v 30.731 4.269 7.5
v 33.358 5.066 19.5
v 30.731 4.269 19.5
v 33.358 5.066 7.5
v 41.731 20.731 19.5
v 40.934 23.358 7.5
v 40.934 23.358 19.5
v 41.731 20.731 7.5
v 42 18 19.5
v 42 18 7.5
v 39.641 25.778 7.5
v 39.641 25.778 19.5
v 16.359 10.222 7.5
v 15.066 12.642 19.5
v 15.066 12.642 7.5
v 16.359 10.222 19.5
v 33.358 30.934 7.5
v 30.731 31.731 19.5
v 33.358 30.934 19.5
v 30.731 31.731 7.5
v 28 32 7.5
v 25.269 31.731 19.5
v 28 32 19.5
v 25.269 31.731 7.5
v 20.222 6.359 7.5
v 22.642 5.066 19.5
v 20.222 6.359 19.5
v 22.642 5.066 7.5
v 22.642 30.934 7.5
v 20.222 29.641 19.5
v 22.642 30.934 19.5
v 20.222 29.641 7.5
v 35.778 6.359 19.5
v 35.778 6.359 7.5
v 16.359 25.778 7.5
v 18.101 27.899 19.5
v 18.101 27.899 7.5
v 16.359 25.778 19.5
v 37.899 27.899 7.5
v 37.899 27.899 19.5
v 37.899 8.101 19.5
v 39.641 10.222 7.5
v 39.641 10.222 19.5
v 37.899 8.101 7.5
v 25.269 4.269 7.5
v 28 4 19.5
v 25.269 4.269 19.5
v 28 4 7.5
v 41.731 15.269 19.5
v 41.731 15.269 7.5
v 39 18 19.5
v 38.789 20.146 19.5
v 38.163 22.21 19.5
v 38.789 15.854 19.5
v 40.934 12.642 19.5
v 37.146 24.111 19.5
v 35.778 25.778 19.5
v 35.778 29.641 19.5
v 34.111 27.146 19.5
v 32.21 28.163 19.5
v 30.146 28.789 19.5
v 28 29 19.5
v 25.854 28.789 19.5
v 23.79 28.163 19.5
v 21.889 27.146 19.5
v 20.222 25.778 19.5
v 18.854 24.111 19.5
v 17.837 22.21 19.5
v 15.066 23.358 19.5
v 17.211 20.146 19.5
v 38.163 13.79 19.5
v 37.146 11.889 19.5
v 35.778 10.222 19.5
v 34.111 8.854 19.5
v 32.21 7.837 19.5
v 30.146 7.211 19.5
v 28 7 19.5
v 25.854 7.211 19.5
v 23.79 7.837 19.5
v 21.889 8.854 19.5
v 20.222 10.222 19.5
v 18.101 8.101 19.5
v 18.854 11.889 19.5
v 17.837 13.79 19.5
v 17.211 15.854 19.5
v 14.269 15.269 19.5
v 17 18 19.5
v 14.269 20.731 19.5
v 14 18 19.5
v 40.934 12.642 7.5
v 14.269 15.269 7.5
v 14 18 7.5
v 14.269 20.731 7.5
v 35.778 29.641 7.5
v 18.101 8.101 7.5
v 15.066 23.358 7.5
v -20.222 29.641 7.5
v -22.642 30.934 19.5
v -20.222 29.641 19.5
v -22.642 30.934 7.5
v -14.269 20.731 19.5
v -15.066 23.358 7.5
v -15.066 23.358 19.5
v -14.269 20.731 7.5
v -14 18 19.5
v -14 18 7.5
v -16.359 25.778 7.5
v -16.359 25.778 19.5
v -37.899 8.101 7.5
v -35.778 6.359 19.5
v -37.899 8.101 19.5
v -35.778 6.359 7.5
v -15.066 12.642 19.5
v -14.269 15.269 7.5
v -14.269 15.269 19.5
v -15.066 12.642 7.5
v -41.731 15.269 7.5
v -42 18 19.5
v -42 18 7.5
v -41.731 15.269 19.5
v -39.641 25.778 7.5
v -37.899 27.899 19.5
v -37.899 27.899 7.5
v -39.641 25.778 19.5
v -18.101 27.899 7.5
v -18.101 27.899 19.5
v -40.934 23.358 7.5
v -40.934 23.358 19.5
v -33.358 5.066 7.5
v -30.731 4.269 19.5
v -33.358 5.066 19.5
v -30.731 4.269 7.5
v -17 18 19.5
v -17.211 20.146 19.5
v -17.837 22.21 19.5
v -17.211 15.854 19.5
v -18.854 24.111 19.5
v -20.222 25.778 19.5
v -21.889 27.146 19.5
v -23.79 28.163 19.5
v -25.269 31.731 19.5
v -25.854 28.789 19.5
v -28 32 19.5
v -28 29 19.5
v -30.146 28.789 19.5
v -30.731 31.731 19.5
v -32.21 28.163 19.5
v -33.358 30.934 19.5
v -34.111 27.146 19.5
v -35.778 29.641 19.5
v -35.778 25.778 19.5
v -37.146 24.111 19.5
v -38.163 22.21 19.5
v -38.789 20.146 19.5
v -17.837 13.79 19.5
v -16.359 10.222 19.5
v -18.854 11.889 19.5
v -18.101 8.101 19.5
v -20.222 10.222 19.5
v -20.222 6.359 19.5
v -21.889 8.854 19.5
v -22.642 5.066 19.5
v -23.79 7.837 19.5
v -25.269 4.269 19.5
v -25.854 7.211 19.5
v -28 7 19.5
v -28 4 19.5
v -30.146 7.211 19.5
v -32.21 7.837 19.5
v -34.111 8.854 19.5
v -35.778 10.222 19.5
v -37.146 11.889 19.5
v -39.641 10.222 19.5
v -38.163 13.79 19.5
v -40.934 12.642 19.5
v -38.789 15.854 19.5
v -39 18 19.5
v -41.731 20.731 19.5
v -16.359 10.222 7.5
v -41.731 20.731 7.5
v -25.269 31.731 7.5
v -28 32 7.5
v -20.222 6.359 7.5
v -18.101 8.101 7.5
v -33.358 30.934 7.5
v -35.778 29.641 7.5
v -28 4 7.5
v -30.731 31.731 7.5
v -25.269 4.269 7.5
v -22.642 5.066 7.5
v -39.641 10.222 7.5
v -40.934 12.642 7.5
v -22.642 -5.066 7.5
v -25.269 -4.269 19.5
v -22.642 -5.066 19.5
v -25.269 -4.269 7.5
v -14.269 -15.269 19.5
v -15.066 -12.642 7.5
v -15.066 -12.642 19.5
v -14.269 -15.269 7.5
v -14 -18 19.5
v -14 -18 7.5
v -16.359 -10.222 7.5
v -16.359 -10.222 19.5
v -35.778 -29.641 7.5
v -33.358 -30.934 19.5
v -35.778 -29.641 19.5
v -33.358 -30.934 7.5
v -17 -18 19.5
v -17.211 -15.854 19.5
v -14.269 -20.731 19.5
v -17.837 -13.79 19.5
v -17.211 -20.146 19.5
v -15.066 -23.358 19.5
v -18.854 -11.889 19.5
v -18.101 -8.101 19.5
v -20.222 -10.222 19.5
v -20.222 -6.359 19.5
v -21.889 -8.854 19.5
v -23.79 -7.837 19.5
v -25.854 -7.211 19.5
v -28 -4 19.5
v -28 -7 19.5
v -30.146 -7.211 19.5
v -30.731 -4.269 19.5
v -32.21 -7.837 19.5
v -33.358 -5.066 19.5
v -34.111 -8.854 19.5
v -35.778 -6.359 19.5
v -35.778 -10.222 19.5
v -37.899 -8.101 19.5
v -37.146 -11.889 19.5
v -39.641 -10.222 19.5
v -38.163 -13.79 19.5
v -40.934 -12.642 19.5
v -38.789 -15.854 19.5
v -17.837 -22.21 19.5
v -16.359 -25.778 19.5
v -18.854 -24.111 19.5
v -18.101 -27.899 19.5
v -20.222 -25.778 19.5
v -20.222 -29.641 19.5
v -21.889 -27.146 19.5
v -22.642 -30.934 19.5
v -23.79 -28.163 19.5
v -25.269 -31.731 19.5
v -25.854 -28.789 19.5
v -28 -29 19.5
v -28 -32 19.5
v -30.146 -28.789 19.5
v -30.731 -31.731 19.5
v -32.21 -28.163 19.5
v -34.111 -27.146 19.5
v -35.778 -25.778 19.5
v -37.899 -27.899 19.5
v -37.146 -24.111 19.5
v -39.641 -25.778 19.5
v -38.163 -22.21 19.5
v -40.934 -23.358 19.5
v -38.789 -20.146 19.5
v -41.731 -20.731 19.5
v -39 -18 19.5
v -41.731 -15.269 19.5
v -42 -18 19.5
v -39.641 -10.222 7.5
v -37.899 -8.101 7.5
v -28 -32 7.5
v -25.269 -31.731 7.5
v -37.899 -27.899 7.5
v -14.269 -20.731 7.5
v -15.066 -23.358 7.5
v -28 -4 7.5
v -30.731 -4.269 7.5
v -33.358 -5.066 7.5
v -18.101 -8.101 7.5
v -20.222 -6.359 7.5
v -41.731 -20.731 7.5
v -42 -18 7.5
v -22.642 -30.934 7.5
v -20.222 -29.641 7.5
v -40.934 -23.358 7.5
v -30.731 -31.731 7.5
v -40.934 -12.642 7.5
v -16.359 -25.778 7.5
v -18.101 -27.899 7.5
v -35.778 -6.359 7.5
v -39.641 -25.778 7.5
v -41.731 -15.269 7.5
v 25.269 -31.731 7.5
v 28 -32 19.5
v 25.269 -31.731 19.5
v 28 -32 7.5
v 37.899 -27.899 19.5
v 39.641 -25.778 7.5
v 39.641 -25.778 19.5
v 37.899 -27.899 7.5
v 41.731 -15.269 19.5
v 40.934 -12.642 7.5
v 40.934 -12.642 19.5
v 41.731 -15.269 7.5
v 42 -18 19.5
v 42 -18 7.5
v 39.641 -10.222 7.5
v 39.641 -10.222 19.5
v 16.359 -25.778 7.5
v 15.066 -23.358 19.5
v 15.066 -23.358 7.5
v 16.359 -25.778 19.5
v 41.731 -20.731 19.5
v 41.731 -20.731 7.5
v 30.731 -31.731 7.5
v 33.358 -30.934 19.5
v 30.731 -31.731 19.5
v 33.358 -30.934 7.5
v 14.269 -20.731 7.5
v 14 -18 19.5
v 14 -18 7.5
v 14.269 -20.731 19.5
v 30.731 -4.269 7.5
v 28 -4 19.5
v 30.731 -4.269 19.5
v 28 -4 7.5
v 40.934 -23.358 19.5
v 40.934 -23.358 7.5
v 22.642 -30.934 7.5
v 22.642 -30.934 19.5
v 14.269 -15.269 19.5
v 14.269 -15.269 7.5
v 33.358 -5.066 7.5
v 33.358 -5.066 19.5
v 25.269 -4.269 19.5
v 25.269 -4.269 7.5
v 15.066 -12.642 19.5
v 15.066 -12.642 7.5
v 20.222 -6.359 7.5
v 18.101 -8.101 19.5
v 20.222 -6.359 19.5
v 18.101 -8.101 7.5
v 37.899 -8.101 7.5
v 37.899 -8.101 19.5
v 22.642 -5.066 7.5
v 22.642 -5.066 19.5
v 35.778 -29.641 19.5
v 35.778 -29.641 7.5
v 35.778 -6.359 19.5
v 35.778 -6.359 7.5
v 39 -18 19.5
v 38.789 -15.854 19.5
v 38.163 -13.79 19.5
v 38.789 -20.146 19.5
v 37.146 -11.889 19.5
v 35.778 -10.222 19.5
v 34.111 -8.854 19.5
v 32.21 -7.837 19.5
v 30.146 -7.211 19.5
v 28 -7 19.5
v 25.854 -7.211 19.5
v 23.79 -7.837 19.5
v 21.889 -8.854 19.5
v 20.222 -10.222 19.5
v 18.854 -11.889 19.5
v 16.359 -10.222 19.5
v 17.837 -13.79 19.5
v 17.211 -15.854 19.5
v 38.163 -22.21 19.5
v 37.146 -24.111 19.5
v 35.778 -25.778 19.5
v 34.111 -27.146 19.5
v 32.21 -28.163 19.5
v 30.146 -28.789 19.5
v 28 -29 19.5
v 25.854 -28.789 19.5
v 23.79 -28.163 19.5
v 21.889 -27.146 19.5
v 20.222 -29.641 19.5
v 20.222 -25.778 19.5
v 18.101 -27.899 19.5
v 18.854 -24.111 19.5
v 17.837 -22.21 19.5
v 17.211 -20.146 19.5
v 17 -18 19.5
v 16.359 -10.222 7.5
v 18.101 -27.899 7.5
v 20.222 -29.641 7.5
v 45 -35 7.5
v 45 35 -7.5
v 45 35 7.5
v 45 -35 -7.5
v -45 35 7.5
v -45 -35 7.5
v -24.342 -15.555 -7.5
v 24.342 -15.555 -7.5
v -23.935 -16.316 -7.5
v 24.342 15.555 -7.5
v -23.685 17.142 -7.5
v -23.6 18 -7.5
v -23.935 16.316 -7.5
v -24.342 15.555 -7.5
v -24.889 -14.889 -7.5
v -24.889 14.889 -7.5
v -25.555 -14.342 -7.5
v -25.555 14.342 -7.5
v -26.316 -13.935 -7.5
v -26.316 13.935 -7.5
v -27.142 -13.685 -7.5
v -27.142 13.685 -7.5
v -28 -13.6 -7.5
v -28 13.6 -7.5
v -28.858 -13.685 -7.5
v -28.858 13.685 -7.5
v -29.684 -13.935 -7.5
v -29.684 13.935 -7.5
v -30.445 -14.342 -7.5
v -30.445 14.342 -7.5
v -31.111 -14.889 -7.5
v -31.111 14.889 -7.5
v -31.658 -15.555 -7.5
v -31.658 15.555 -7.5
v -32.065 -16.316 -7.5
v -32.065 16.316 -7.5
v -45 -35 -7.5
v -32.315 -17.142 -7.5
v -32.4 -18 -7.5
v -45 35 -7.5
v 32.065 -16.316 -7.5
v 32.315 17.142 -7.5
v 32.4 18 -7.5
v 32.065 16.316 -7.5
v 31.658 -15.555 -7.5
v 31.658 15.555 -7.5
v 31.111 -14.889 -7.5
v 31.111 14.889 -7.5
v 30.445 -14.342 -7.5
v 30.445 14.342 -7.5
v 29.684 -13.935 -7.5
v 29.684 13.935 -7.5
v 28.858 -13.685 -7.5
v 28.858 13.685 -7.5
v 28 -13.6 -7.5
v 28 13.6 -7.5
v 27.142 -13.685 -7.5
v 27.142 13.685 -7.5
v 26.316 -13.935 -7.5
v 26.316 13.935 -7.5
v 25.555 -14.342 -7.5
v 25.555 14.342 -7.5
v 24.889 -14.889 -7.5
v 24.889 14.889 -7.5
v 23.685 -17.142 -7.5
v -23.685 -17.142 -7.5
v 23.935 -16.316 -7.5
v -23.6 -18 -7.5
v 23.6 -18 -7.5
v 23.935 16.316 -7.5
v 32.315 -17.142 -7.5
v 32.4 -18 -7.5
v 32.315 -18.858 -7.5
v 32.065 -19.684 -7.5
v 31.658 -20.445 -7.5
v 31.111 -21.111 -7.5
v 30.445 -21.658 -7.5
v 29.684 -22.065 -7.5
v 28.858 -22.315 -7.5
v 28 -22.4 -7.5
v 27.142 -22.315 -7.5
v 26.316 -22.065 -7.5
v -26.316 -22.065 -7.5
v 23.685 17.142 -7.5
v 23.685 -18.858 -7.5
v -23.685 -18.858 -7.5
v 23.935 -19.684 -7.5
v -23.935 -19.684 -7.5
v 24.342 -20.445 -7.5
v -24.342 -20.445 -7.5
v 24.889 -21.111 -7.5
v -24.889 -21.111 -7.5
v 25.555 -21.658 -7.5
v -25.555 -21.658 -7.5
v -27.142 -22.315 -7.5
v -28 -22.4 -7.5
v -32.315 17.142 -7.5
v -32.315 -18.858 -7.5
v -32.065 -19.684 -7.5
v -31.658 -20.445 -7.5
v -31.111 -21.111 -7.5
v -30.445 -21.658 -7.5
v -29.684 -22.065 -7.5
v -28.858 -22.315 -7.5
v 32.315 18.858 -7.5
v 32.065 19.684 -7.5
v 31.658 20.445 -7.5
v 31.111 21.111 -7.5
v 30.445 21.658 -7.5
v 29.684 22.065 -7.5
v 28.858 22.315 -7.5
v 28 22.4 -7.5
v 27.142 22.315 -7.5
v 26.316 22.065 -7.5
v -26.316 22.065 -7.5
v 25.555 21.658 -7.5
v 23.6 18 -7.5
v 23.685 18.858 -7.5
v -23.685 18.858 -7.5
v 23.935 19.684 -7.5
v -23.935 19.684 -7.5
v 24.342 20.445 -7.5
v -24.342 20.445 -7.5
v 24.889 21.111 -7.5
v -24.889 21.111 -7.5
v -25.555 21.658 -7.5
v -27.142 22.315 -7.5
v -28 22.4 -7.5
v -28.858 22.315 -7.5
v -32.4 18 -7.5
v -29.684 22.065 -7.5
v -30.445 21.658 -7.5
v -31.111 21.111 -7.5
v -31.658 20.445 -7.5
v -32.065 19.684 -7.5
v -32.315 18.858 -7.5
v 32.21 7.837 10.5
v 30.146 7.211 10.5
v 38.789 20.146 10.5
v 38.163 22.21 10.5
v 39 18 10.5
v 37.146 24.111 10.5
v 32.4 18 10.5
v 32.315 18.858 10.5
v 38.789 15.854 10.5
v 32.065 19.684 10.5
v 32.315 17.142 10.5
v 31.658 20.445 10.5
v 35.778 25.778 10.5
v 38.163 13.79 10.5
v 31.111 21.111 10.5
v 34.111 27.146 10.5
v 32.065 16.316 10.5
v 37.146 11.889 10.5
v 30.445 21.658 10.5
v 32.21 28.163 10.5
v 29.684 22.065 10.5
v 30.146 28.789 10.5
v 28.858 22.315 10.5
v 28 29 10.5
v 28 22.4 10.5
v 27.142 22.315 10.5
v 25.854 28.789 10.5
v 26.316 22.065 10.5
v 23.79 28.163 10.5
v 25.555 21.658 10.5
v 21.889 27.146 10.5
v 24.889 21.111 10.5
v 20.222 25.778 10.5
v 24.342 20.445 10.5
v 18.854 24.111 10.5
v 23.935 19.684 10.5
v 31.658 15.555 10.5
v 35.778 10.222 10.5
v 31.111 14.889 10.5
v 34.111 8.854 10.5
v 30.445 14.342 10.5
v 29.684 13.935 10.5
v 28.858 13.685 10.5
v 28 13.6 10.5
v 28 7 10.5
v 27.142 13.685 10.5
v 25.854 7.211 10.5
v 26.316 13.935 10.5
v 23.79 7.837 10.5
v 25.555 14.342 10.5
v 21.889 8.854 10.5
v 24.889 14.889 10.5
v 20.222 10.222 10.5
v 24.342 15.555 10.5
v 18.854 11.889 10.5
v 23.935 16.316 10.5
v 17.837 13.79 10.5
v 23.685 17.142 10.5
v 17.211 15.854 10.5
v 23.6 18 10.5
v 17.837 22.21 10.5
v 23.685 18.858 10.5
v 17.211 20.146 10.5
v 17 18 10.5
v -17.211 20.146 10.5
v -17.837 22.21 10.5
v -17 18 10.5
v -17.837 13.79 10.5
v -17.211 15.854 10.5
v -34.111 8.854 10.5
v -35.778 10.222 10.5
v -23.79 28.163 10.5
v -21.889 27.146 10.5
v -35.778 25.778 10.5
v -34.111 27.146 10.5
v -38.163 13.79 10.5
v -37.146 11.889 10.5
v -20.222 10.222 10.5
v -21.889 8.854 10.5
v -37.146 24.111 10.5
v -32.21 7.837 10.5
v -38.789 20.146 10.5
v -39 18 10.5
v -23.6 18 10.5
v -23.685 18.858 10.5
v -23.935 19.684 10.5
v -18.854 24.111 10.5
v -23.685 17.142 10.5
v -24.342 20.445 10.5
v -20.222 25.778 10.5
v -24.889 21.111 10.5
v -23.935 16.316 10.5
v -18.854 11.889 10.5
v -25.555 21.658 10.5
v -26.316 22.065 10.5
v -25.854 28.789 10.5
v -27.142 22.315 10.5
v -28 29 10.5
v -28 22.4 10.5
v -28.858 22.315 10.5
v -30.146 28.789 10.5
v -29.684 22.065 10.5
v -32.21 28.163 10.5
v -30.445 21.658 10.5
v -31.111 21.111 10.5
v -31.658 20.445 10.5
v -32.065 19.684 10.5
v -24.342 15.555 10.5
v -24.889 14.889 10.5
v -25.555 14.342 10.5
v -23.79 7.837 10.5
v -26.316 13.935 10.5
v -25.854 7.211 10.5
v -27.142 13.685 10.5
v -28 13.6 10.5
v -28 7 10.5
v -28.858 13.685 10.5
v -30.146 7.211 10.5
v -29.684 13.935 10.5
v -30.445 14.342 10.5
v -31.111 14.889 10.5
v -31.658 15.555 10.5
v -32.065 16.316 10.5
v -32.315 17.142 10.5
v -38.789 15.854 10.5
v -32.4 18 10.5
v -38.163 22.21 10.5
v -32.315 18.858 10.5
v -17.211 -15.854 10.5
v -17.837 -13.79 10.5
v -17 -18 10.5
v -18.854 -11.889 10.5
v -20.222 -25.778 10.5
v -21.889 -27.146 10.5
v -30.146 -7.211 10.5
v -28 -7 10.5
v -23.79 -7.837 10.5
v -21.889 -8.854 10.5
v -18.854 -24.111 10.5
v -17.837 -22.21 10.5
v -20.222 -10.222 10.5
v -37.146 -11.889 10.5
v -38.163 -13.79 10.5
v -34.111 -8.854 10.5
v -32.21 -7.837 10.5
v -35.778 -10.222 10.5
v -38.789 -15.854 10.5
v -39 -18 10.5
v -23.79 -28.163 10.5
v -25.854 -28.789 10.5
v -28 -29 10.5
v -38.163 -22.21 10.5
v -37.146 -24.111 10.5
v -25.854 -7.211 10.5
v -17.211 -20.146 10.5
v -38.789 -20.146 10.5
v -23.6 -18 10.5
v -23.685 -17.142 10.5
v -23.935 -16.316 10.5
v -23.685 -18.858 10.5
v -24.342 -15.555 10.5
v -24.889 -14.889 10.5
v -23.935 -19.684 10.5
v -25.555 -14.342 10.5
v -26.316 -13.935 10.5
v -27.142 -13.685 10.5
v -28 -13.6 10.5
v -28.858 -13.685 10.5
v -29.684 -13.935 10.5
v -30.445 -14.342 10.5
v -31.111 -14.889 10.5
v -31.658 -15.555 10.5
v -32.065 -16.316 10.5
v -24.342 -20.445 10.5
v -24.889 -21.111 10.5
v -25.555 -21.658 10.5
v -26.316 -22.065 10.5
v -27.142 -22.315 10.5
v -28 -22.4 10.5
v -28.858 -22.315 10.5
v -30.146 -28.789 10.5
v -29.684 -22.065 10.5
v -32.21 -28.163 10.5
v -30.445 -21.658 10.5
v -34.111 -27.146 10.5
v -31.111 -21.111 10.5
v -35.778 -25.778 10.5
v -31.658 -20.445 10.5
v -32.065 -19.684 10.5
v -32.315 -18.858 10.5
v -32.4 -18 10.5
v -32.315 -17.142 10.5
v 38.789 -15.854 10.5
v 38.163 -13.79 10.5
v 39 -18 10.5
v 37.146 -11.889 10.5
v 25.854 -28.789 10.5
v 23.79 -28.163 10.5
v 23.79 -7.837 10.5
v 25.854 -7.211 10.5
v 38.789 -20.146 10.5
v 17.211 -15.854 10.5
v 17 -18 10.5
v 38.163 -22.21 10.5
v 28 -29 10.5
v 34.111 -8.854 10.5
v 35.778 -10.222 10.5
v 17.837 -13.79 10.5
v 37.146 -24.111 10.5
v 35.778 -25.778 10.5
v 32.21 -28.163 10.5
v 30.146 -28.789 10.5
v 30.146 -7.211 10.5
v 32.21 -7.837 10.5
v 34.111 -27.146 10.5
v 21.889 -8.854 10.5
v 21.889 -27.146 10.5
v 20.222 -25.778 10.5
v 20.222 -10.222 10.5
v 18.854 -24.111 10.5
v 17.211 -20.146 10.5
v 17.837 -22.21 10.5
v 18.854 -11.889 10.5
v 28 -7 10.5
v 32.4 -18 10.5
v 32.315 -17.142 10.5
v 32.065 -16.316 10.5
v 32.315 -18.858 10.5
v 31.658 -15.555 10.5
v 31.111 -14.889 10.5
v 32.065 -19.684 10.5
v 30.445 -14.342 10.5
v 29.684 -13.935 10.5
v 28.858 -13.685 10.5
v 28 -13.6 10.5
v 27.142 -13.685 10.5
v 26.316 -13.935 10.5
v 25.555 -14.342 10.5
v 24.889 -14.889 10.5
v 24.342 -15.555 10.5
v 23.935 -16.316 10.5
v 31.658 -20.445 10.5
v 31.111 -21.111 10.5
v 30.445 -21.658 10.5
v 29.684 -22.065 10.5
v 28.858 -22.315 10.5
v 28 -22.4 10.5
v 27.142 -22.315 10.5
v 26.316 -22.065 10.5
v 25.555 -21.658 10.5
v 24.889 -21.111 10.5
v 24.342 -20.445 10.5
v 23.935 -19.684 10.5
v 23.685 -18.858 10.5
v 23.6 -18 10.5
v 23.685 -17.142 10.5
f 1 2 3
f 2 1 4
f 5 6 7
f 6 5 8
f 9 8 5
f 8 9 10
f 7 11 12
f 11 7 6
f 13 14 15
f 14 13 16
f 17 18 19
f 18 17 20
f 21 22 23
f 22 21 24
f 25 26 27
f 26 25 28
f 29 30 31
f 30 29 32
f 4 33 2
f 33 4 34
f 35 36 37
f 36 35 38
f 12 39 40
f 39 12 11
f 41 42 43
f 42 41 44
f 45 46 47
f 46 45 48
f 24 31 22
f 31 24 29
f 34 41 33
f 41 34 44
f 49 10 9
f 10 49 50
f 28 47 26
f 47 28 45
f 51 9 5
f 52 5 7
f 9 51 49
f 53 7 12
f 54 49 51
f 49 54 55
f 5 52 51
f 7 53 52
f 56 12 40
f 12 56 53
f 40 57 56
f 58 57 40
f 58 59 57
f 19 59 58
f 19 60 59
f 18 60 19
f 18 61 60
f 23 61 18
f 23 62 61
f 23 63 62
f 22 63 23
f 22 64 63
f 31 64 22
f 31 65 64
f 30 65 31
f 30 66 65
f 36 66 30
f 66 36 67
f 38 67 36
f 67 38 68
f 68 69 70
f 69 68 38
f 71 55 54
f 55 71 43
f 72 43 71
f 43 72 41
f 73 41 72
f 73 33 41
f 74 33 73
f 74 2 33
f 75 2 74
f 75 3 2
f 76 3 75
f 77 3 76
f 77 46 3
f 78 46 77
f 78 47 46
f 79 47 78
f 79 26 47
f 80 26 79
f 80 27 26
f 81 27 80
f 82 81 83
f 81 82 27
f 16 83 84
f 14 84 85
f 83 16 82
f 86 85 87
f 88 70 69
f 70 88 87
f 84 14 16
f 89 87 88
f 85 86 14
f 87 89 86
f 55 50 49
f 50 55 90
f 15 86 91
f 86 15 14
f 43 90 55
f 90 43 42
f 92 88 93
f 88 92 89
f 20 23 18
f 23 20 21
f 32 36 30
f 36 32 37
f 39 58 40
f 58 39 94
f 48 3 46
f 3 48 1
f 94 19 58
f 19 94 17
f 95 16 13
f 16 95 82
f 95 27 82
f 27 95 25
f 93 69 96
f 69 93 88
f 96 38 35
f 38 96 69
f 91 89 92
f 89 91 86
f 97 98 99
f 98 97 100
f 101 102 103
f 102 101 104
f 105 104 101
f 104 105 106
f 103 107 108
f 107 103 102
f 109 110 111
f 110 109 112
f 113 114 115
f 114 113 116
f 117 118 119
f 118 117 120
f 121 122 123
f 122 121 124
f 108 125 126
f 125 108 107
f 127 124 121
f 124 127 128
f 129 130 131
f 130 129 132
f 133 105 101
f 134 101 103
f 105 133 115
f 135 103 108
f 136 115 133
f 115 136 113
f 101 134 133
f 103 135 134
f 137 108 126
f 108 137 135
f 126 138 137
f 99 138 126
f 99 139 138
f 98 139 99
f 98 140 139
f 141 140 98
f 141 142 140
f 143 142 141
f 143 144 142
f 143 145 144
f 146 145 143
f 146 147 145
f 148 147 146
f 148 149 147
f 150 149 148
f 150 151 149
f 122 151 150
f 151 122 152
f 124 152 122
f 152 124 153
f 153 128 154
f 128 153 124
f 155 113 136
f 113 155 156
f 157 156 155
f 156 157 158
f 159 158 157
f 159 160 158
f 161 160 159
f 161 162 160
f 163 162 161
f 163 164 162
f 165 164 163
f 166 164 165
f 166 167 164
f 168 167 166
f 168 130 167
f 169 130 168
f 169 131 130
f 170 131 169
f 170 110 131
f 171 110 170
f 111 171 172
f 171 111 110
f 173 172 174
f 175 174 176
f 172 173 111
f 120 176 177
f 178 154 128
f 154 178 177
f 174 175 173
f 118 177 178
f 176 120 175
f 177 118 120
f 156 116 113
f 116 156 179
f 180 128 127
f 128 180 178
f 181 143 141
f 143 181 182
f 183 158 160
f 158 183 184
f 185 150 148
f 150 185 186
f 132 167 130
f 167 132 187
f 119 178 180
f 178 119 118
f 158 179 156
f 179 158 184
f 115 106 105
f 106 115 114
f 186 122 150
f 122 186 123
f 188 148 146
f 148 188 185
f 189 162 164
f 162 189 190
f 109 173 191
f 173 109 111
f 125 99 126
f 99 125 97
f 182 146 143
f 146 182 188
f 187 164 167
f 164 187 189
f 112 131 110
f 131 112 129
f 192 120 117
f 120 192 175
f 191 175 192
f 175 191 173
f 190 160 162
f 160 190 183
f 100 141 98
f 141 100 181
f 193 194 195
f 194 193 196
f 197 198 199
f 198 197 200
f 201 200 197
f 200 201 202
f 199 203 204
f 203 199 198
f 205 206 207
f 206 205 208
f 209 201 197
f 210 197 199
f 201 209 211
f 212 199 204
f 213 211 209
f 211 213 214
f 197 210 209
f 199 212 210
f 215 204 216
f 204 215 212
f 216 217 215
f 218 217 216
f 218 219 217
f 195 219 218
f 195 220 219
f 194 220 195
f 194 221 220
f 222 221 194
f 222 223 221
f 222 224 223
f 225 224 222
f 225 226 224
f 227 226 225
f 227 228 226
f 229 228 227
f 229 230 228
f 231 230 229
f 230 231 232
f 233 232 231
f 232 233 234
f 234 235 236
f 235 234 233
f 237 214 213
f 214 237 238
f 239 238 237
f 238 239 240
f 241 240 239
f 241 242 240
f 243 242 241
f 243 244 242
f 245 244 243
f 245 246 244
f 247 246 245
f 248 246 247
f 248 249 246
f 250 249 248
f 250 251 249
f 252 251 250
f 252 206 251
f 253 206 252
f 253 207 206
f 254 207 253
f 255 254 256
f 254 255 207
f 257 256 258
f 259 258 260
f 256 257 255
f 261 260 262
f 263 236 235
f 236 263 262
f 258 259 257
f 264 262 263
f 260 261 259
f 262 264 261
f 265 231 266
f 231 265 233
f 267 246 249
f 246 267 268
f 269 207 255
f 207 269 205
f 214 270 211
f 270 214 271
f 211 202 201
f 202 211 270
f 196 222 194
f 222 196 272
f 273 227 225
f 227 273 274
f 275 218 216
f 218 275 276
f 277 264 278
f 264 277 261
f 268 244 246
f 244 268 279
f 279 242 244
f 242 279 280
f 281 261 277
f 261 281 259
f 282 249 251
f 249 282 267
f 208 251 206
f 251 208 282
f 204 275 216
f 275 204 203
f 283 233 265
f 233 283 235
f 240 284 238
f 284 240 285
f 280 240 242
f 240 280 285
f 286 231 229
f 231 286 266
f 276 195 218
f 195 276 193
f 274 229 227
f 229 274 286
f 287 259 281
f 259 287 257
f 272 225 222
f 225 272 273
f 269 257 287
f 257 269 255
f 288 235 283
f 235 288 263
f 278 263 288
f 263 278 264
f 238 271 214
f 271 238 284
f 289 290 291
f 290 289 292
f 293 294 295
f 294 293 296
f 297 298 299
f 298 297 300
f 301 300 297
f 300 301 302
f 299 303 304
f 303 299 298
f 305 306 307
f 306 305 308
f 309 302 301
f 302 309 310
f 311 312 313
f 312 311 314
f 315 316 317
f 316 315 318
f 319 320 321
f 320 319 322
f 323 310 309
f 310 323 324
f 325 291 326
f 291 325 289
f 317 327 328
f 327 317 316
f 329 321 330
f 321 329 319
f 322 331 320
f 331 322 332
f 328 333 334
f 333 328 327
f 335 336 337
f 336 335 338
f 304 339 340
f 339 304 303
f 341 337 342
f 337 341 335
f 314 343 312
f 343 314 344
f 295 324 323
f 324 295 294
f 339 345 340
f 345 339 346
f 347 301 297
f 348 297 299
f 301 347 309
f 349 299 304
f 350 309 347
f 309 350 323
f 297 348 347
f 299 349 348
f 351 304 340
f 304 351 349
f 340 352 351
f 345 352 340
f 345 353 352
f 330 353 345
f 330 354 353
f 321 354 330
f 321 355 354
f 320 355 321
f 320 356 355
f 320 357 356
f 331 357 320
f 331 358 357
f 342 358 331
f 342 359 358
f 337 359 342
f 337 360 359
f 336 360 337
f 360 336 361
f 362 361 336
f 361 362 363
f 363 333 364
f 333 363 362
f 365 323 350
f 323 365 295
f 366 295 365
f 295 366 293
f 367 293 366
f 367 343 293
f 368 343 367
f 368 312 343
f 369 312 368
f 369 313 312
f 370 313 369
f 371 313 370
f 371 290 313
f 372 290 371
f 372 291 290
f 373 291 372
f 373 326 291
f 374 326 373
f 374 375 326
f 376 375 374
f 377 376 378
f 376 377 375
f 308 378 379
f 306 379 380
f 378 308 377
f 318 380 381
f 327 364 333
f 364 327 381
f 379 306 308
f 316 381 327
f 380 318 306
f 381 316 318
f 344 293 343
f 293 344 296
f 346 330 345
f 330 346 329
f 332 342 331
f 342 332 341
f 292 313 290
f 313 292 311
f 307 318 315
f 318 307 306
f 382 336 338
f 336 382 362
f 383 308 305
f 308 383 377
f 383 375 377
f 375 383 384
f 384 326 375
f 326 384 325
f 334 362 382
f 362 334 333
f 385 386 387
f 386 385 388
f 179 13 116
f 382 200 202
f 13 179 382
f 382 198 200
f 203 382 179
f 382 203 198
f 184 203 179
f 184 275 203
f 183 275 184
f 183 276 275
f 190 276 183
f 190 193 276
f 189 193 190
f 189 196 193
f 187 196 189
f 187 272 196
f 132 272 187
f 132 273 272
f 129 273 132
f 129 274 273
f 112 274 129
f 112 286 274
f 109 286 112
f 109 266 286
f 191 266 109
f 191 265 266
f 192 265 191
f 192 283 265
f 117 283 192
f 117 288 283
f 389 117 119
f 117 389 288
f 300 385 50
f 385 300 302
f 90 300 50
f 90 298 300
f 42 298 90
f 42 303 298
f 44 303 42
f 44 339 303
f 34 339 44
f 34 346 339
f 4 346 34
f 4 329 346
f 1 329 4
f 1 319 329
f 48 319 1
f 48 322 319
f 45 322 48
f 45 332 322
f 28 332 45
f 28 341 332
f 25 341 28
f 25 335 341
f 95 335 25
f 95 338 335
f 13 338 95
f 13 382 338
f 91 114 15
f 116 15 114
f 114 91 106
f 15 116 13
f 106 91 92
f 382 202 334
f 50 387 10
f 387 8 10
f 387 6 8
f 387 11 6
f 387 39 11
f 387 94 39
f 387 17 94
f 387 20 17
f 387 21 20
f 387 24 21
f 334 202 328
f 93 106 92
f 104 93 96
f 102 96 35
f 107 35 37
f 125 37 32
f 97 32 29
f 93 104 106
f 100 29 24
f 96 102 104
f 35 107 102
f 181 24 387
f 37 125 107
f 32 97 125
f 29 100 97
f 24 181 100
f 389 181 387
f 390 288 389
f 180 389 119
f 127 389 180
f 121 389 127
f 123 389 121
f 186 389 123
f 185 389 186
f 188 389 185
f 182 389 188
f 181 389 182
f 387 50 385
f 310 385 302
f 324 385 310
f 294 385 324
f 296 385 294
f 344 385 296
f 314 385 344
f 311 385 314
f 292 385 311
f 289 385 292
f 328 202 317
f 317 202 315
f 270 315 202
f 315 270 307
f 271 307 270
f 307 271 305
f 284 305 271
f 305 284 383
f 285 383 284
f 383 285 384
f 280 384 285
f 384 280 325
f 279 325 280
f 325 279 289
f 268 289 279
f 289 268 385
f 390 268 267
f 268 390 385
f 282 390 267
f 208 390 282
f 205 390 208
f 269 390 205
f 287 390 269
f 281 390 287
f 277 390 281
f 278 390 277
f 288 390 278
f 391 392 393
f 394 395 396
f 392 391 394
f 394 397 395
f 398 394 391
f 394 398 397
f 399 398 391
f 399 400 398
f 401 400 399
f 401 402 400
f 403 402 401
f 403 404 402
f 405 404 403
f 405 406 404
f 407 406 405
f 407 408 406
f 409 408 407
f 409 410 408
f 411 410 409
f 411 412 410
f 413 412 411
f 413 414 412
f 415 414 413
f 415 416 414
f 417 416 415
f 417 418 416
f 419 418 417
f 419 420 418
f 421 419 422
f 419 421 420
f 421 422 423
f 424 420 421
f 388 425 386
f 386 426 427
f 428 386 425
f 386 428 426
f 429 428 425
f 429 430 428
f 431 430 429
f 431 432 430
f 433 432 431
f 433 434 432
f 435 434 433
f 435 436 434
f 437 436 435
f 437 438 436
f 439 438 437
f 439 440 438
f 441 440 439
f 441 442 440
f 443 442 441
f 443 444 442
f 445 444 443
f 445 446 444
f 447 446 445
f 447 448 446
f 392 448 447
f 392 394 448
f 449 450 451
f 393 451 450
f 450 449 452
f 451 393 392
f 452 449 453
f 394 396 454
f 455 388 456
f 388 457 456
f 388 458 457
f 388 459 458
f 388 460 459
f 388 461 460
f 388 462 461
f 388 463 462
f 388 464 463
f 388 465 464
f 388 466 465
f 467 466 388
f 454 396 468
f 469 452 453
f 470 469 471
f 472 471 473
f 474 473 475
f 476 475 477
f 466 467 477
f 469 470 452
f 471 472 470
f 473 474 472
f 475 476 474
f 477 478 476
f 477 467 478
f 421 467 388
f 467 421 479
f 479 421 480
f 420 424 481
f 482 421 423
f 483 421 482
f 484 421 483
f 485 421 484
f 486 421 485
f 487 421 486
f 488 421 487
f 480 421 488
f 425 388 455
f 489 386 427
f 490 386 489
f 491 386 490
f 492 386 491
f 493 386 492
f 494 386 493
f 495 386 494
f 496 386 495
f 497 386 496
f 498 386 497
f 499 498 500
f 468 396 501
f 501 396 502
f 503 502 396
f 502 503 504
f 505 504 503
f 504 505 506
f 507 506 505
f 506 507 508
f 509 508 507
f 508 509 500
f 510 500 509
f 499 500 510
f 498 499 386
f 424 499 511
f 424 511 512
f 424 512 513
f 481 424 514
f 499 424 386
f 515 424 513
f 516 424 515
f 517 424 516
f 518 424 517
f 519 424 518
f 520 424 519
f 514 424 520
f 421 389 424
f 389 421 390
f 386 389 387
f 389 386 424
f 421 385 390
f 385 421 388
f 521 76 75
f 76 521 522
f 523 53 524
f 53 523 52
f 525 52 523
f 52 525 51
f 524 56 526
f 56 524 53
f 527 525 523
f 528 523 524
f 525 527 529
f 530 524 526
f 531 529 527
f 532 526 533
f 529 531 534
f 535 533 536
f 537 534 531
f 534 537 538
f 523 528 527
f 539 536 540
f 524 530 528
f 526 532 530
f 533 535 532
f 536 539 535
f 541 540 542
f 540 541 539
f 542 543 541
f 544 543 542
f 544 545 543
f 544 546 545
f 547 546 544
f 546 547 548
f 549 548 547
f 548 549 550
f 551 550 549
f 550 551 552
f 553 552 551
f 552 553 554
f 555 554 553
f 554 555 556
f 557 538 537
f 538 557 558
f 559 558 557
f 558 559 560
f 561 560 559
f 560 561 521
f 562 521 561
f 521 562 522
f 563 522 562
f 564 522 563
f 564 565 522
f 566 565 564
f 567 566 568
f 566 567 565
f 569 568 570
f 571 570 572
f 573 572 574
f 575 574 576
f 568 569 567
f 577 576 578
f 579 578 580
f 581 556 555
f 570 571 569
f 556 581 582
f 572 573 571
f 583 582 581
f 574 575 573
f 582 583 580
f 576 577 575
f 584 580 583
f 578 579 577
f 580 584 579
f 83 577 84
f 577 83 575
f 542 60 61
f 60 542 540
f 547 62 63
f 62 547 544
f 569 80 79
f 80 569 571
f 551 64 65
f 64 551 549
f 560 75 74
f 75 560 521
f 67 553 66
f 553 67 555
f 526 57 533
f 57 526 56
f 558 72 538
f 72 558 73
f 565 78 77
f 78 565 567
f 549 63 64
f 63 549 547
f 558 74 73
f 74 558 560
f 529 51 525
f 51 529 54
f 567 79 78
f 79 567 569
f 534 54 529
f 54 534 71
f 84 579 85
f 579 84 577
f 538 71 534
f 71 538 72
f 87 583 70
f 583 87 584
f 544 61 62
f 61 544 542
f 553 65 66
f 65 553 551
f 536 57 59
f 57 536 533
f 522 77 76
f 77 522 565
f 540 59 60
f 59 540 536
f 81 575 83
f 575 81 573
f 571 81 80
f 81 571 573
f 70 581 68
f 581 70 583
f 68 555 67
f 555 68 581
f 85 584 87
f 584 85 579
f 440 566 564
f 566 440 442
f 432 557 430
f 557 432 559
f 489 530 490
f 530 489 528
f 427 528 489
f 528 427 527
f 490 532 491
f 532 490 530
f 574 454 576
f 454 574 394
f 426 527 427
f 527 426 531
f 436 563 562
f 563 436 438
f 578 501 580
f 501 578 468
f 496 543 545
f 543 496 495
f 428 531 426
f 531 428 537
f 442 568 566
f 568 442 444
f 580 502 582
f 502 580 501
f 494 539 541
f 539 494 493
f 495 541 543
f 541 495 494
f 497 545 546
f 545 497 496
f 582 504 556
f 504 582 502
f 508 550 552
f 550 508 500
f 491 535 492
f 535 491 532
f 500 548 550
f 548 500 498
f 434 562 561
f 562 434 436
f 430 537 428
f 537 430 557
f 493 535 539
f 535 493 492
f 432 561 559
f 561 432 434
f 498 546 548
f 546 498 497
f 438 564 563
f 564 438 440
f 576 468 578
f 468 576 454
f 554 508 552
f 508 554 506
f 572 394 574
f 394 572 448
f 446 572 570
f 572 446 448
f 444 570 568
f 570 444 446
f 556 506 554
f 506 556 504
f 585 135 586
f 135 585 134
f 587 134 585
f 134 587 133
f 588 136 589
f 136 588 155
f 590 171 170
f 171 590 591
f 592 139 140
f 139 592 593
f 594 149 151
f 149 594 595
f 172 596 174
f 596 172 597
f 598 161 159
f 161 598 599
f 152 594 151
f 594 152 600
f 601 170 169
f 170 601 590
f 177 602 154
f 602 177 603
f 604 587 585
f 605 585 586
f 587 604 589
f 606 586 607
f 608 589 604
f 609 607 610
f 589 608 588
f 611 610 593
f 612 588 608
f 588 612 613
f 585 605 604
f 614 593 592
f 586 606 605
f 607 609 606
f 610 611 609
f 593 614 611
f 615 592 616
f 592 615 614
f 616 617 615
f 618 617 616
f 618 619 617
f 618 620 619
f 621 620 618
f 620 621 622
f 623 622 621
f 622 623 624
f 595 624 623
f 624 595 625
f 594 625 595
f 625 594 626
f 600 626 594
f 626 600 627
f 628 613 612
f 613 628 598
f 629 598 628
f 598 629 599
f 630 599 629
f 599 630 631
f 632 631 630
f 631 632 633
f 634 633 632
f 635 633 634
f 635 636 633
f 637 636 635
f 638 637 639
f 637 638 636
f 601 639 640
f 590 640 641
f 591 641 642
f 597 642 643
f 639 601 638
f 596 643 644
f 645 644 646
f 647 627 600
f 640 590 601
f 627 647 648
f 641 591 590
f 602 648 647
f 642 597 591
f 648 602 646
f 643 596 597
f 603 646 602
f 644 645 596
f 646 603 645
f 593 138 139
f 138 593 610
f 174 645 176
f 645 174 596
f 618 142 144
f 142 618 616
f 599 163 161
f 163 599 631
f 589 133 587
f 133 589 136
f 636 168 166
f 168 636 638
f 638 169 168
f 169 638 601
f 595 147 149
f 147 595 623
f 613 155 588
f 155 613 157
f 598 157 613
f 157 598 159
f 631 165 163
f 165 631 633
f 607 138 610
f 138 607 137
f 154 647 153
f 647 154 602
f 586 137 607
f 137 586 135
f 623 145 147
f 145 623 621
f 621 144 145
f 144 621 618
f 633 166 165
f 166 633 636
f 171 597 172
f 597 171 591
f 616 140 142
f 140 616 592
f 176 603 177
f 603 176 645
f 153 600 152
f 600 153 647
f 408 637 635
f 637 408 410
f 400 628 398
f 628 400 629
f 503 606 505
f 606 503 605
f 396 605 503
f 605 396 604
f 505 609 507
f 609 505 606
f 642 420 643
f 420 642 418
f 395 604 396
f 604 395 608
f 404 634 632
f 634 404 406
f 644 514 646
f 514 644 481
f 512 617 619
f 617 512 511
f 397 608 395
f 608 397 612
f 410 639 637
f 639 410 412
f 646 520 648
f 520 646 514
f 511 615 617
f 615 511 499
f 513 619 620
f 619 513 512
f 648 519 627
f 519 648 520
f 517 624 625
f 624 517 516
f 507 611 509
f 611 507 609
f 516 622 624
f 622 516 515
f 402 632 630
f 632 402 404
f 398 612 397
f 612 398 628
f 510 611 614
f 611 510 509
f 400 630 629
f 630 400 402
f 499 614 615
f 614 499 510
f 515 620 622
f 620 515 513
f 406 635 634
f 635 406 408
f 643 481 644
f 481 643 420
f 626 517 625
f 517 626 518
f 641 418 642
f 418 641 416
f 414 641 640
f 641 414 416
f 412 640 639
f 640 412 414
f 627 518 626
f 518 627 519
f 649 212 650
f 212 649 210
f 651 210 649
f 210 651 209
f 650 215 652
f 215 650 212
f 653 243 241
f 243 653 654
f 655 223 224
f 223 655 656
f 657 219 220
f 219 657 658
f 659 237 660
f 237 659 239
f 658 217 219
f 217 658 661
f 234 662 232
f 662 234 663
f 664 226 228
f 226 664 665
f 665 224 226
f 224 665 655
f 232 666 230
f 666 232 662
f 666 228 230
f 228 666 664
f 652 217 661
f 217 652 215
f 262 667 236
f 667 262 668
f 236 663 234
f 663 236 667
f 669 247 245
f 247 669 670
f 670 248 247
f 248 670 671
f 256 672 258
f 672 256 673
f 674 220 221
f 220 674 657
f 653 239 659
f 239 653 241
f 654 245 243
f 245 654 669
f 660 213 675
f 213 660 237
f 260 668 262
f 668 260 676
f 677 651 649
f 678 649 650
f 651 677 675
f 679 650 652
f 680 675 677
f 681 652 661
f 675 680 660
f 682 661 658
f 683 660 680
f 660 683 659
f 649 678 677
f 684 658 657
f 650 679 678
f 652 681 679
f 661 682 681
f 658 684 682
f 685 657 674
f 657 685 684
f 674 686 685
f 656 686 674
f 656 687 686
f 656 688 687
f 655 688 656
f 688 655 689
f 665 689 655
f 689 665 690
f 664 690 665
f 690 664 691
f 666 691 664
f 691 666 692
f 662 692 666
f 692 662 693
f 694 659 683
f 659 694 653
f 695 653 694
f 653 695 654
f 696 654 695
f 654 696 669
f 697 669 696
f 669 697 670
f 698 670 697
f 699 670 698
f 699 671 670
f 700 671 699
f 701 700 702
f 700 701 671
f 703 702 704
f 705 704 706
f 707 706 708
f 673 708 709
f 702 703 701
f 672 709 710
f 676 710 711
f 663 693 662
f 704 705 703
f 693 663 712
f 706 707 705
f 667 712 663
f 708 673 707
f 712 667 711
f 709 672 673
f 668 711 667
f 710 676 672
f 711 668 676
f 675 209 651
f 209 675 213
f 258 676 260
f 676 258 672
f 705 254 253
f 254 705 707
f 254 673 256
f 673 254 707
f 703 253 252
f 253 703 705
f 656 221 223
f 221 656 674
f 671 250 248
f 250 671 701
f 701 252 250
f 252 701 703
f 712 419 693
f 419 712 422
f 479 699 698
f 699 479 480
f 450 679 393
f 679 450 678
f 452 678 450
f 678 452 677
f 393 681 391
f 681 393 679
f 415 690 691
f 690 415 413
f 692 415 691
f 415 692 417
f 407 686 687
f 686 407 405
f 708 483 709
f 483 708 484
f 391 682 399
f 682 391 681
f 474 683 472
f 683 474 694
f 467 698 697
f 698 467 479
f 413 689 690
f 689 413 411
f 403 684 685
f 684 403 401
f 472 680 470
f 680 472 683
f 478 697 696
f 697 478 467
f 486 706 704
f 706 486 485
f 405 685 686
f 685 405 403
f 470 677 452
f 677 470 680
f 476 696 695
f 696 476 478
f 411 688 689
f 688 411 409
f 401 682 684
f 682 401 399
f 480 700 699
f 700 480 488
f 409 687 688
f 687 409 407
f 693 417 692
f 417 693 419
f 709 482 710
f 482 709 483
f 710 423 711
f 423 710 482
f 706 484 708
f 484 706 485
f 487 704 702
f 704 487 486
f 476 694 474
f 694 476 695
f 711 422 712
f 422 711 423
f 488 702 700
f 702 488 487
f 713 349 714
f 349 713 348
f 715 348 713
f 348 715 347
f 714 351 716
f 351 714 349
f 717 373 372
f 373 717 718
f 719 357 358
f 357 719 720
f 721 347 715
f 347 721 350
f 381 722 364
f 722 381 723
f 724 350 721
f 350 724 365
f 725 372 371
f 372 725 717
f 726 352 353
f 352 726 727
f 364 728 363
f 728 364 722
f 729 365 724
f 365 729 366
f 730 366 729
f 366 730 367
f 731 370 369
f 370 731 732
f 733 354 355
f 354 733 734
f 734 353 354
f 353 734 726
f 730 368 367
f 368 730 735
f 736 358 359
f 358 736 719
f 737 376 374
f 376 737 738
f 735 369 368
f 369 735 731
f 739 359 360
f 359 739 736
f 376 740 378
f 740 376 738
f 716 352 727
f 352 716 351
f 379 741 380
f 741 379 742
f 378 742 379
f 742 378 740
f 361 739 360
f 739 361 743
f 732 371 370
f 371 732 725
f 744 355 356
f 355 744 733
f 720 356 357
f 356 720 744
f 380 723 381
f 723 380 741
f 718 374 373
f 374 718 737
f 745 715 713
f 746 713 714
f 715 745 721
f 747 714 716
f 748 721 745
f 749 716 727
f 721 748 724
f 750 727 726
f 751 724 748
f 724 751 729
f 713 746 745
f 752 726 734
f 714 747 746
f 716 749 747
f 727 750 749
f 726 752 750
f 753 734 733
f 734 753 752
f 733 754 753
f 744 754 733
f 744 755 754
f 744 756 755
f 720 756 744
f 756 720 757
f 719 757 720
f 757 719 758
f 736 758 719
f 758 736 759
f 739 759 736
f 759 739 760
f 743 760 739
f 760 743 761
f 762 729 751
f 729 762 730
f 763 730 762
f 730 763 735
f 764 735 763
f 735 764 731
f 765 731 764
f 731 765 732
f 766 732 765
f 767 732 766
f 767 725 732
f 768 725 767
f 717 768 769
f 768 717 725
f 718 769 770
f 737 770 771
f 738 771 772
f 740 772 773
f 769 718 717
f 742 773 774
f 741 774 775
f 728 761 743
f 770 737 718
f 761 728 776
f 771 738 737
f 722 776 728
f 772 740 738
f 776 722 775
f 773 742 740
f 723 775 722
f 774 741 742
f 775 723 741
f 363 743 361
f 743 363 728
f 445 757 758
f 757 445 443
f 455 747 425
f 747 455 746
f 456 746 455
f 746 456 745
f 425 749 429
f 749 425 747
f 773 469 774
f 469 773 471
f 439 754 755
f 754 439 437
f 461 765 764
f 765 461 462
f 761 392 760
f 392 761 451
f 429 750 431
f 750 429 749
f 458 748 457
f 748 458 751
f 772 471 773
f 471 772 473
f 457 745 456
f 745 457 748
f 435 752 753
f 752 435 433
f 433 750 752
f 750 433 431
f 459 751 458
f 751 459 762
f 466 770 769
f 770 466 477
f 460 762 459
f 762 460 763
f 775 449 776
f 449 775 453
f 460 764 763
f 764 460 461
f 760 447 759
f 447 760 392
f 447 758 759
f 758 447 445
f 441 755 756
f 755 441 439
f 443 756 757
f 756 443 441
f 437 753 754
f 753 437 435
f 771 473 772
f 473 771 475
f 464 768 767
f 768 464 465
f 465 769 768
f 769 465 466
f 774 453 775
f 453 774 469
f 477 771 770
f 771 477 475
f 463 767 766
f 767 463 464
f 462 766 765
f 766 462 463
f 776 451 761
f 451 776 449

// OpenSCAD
$fn = 32;

// ----------------------------------------------------------------------
// Socket pad plate
// bosses with counterbored sockets for the screws
// ----------------------------------------------------------------------

// --- parameters (mm) ---
base_t = 15;           // base plate thickness
boss_h = 12;           // boss height above the base plate
boss_d = 28;           // boss diameter
socket_d = 22;         // socket diameter
socket_depth = 9;      // socket depth from the boss face
bolt_d = 8.8;          // screw clearance hole through the socket floor
plate = [90, 70, 15];  // overall size (x, y, z)
edge = 17;             // boss centre offset from the plate edge
pads = 4;              // boss count, one per corner

// --- derived feature positions (mm) ---
height = base_t + boss_h;        // = 27   overall height of the part
corner_x = plate[0] / 2 - edge;  // = 28   boss centre X
corner_y = plate[1] / 2 - edge;  // = 18   boss centre Y
feature_centers = [
  [corner_x, corner_y],
  [-corner_x, corner_y],
  [-corner_x, -corner_y],
  [corner_x, -corner_y]
];   // boss centres: sockets, holes and the pads themselves are placed from here

// base plate, bosses on feature_centers, socket + through hole in each
difference() {
  union() {
    cube(plate, center = true);
    for (centre = feature_centers)
      translate([centre[0], centre[1], plate[2] / 2 - 1])
        cylinder(d = boss_d, h = boss_h + 1);
  }
  for (centre = feature_centers) {
    translate([centre[0], centre[1], plate[2] / 2 + boss_h - socket_depth])
      cylinder(d = socket_d, h = socket_depth + 1);
    translate([centre[0], centre[1], -height])
      cylinder(d = bolt_d, h = 2 * height + 2);  // through the socket floor
  }
}
